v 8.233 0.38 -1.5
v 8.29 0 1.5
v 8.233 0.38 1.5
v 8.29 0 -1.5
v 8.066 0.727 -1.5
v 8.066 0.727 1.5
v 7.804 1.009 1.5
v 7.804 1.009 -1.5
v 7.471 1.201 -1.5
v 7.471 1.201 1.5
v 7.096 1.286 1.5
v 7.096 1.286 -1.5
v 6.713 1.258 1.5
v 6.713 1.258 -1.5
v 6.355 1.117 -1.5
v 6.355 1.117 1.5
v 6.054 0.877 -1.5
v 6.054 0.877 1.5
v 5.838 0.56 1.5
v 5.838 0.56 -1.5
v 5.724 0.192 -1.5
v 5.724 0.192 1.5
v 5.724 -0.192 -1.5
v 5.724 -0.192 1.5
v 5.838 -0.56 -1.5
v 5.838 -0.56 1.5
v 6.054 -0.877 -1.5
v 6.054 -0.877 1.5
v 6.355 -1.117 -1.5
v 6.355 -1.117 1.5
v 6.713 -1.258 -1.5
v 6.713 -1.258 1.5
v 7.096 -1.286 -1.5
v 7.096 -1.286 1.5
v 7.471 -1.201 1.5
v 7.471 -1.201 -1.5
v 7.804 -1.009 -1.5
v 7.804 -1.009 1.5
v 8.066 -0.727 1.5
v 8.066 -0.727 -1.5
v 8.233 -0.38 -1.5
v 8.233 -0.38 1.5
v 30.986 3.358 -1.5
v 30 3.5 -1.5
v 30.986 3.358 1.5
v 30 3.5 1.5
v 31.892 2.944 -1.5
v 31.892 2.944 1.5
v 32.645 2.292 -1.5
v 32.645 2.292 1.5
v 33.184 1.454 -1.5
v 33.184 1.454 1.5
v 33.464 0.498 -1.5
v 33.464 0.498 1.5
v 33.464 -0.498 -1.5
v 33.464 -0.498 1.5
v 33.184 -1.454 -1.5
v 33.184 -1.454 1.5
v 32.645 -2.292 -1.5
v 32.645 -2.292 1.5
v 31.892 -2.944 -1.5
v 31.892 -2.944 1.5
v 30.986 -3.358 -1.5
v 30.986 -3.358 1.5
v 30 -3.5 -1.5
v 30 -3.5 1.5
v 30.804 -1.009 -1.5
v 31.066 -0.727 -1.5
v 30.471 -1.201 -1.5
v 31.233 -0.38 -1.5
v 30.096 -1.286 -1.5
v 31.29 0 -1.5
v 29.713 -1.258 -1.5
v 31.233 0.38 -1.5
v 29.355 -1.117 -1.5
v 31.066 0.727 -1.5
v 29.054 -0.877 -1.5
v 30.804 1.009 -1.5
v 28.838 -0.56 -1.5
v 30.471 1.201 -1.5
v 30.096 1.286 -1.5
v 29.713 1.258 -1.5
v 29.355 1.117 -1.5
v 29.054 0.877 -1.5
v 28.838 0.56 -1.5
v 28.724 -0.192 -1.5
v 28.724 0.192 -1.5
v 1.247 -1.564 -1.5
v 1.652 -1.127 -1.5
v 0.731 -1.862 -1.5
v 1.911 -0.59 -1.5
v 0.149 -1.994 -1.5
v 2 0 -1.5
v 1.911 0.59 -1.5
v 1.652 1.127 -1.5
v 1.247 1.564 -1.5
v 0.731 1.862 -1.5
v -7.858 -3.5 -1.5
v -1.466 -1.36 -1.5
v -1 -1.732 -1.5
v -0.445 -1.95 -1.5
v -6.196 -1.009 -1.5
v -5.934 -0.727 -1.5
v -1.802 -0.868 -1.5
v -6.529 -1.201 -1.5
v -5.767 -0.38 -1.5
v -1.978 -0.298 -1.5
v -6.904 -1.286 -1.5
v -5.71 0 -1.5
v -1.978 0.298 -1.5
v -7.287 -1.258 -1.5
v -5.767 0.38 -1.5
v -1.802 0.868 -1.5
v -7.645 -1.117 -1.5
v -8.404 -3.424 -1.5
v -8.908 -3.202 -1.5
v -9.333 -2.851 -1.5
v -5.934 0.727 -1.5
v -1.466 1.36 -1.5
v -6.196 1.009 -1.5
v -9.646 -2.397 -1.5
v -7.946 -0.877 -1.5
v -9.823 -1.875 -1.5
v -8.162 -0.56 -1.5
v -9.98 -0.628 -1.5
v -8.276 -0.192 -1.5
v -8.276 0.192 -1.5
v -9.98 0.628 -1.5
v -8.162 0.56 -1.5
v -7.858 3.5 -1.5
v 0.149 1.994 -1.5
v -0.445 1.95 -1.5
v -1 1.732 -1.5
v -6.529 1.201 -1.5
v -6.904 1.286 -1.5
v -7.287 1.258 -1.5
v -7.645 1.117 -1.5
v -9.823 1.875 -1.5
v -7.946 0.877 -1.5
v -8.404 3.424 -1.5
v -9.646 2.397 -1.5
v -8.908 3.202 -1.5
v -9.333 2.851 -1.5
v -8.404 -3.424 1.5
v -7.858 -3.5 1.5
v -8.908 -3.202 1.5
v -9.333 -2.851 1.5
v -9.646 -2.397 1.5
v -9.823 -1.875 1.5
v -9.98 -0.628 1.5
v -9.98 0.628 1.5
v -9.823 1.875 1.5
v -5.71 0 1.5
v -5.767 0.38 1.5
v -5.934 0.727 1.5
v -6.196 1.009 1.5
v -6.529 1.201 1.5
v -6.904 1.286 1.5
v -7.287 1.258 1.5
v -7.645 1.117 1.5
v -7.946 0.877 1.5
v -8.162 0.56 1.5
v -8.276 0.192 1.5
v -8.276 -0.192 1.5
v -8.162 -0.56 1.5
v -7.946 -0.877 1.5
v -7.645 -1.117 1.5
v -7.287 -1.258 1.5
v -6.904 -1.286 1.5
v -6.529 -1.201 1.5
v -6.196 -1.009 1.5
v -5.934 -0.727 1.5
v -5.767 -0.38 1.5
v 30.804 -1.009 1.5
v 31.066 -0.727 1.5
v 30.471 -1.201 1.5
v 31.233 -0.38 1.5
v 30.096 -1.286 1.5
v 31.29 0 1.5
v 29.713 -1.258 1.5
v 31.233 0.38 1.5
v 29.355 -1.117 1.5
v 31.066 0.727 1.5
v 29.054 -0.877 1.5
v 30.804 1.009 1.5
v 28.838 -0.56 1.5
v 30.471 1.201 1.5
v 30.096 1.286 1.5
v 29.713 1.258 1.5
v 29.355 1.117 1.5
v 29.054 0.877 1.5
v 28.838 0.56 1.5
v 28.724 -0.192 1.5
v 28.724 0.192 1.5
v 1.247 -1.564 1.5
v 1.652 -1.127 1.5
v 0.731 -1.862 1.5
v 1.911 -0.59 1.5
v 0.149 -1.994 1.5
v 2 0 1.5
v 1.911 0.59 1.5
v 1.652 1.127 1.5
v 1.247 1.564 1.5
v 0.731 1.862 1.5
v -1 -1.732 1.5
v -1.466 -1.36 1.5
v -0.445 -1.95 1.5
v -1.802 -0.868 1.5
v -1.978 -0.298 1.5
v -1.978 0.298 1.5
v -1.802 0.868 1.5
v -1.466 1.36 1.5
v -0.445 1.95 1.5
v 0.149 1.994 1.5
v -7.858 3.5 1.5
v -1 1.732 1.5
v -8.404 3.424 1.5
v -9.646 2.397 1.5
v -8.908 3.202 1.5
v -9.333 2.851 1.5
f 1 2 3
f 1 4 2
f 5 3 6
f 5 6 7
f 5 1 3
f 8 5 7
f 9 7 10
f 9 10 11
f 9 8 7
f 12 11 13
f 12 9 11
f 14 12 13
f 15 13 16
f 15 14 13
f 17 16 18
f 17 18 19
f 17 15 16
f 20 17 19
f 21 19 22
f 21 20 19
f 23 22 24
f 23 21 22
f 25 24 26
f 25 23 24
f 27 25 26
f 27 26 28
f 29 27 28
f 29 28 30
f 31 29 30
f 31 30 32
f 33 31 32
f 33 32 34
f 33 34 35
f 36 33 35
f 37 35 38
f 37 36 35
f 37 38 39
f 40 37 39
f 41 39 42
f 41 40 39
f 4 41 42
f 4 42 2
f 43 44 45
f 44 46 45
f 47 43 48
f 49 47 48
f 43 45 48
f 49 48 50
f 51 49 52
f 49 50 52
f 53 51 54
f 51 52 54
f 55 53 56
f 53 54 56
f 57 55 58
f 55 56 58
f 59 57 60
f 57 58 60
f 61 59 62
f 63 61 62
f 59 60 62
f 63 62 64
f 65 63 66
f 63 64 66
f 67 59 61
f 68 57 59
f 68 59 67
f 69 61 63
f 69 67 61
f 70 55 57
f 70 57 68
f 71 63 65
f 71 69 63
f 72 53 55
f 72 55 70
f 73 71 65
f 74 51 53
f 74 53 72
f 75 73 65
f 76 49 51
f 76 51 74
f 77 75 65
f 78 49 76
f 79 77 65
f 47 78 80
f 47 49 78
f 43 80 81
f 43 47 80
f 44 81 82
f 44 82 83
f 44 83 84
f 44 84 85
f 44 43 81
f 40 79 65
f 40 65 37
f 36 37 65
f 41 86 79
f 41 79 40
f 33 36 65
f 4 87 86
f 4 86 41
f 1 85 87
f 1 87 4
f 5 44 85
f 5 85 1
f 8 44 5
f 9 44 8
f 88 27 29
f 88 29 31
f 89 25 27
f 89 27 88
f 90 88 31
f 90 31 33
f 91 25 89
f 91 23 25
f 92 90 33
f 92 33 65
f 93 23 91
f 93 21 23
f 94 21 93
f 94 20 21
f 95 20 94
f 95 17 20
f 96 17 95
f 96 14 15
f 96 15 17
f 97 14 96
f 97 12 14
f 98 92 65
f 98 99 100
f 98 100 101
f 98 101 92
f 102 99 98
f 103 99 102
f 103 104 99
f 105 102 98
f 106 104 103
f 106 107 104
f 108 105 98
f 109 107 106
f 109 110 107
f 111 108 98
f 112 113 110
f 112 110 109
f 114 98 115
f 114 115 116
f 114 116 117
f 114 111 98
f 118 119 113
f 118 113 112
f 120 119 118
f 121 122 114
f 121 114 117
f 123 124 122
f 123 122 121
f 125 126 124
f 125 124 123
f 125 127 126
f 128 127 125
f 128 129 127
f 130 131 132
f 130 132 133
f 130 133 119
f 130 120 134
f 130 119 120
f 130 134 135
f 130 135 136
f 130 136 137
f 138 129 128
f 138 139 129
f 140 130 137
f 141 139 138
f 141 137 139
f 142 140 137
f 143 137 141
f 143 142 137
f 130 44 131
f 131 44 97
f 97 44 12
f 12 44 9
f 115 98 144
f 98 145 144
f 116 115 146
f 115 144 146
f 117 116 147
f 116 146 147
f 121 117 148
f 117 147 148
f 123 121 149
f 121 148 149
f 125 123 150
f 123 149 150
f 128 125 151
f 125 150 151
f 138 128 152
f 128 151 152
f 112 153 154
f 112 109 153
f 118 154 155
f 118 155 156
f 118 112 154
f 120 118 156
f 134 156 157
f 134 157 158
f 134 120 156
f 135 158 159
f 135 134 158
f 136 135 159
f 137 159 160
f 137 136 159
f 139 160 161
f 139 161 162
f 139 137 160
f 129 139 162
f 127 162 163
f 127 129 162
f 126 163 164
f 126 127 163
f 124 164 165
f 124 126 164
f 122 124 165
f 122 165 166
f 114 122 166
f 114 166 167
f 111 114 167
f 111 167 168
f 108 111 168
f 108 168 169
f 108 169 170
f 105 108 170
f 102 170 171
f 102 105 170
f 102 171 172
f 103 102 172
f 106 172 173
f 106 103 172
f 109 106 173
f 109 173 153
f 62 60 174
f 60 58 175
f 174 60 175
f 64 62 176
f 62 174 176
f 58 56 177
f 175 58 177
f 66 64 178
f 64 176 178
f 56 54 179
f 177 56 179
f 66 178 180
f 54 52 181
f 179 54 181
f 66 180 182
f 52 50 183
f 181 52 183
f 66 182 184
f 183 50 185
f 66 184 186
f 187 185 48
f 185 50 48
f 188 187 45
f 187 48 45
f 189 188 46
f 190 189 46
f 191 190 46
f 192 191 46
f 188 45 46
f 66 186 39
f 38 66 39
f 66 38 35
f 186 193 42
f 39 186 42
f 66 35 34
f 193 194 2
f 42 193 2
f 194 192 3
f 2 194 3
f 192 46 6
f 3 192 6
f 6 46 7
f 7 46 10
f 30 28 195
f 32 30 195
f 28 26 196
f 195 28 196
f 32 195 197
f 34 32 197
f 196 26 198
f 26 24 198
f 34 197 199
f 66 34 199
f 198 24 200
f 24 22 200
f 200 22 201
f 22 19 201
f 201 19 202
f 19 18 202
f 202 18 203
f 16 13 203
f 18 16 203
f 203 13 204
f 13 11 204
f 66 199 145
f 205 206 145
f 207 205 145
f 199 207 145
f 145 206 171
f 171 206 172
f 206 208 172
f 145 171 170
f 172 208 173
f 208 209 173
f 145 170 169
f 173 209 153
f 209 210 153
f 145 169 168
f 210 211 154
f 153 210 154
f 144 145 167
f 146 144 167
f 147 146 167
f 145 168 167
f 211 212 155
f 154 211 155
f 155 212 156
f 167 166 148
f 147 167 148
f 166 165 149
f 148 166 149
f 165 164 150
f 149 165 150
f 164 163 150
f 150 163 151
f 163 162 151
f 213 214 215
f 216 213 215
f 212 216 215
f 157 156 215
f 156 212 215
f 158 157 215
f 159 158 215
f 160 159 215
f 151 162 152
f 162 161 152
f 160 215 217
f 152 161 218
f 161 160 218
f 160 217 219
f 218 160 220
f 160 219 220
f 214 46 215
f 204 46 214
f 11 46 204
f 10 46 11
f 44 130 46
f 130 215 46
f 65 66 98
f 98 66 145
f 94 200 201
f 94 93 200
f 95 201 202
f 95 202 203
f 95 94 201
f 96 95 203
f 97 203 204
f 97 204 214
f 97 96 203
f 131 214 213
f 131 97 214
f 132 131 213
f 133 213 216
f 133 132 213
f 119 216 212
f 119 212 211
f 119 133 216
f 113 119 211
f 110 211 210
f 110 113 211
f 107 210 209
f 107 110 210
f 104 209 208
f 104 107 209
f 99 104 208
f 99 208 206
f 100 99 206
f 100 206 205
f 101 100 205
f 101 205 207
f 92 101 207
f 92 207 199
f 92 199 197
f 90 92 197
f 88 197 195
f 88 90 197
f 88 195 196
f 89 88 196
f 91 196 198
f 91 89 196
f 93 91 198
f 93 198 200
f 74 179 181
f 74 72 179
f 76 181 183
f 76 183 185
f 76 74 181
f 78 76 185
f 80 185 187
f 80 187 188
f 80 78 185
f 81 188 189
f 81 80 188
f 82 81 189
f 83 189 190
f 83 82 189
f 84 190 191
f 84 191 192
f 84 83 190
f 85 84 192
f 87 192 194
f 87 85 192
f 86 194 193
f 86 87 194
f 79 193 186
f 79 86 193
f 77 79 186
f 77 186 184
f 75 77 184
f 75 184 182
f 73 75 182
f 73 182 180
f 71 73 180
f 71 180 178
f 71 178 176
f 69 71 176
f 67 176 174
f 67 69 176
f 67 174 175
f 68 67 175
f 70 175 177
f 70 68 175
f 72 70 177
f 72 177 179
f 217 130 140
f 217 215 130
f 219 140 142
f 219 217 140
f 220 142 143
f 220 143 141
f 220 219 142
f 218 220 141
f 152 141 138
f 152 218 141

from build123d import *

# Parameters (mm, degrees)
SKETCH1_R           = 1.29
SKETCH1_R_2         = 2
BOSS_EXTRUDE1_DEPTH = 1.5
FILLET1_R           = 2


with BuildPart() as part:
    # Sketch1 → Boss-Extrude1 (new, symmetric)
    with BuildSketch(Plane.XY):
        with BuildLine():
            Line((-9.367496998, 3.5), (30, 3.5))
            ThreePointArc((30, 3.5), (33.5, 0), (30, -3.5))
            Line((30, -3.5), (-9.367496998, -3.5))
            ThreePointArc((-9.367496998, -3.5), (-10, 0), (-9.367496998, 3.5))
        make_face()
        with Locations((-7, 0)):
            Circle(SKETCH1_R, mode=Mode.SUBTRACT)
        with Locations((7, 0)):
            Circle(SKETCH1_R, mode=Mode.SUBTRACT)
        with Locations((30, 0)):
            Circle(SKETCH1_R, mode=Mode.SUBTRACT)
        Circle(SKETCH1_R_2, mode=Mode.SUBTRACT)
    extrude(amount=BOSS_EXTRUDE1_DEPTH, both=True)

    # Fillet1
    fillet1_edges = [part.edges().sort_by_distance(p)[0] for p in [
        (-9.367496998, 3.5, 0),
        (-9.367496998, -3.5, 0),
    ]]
    fillet(fillet1_edges, radius=FILLET1_R)


solid = part.part
